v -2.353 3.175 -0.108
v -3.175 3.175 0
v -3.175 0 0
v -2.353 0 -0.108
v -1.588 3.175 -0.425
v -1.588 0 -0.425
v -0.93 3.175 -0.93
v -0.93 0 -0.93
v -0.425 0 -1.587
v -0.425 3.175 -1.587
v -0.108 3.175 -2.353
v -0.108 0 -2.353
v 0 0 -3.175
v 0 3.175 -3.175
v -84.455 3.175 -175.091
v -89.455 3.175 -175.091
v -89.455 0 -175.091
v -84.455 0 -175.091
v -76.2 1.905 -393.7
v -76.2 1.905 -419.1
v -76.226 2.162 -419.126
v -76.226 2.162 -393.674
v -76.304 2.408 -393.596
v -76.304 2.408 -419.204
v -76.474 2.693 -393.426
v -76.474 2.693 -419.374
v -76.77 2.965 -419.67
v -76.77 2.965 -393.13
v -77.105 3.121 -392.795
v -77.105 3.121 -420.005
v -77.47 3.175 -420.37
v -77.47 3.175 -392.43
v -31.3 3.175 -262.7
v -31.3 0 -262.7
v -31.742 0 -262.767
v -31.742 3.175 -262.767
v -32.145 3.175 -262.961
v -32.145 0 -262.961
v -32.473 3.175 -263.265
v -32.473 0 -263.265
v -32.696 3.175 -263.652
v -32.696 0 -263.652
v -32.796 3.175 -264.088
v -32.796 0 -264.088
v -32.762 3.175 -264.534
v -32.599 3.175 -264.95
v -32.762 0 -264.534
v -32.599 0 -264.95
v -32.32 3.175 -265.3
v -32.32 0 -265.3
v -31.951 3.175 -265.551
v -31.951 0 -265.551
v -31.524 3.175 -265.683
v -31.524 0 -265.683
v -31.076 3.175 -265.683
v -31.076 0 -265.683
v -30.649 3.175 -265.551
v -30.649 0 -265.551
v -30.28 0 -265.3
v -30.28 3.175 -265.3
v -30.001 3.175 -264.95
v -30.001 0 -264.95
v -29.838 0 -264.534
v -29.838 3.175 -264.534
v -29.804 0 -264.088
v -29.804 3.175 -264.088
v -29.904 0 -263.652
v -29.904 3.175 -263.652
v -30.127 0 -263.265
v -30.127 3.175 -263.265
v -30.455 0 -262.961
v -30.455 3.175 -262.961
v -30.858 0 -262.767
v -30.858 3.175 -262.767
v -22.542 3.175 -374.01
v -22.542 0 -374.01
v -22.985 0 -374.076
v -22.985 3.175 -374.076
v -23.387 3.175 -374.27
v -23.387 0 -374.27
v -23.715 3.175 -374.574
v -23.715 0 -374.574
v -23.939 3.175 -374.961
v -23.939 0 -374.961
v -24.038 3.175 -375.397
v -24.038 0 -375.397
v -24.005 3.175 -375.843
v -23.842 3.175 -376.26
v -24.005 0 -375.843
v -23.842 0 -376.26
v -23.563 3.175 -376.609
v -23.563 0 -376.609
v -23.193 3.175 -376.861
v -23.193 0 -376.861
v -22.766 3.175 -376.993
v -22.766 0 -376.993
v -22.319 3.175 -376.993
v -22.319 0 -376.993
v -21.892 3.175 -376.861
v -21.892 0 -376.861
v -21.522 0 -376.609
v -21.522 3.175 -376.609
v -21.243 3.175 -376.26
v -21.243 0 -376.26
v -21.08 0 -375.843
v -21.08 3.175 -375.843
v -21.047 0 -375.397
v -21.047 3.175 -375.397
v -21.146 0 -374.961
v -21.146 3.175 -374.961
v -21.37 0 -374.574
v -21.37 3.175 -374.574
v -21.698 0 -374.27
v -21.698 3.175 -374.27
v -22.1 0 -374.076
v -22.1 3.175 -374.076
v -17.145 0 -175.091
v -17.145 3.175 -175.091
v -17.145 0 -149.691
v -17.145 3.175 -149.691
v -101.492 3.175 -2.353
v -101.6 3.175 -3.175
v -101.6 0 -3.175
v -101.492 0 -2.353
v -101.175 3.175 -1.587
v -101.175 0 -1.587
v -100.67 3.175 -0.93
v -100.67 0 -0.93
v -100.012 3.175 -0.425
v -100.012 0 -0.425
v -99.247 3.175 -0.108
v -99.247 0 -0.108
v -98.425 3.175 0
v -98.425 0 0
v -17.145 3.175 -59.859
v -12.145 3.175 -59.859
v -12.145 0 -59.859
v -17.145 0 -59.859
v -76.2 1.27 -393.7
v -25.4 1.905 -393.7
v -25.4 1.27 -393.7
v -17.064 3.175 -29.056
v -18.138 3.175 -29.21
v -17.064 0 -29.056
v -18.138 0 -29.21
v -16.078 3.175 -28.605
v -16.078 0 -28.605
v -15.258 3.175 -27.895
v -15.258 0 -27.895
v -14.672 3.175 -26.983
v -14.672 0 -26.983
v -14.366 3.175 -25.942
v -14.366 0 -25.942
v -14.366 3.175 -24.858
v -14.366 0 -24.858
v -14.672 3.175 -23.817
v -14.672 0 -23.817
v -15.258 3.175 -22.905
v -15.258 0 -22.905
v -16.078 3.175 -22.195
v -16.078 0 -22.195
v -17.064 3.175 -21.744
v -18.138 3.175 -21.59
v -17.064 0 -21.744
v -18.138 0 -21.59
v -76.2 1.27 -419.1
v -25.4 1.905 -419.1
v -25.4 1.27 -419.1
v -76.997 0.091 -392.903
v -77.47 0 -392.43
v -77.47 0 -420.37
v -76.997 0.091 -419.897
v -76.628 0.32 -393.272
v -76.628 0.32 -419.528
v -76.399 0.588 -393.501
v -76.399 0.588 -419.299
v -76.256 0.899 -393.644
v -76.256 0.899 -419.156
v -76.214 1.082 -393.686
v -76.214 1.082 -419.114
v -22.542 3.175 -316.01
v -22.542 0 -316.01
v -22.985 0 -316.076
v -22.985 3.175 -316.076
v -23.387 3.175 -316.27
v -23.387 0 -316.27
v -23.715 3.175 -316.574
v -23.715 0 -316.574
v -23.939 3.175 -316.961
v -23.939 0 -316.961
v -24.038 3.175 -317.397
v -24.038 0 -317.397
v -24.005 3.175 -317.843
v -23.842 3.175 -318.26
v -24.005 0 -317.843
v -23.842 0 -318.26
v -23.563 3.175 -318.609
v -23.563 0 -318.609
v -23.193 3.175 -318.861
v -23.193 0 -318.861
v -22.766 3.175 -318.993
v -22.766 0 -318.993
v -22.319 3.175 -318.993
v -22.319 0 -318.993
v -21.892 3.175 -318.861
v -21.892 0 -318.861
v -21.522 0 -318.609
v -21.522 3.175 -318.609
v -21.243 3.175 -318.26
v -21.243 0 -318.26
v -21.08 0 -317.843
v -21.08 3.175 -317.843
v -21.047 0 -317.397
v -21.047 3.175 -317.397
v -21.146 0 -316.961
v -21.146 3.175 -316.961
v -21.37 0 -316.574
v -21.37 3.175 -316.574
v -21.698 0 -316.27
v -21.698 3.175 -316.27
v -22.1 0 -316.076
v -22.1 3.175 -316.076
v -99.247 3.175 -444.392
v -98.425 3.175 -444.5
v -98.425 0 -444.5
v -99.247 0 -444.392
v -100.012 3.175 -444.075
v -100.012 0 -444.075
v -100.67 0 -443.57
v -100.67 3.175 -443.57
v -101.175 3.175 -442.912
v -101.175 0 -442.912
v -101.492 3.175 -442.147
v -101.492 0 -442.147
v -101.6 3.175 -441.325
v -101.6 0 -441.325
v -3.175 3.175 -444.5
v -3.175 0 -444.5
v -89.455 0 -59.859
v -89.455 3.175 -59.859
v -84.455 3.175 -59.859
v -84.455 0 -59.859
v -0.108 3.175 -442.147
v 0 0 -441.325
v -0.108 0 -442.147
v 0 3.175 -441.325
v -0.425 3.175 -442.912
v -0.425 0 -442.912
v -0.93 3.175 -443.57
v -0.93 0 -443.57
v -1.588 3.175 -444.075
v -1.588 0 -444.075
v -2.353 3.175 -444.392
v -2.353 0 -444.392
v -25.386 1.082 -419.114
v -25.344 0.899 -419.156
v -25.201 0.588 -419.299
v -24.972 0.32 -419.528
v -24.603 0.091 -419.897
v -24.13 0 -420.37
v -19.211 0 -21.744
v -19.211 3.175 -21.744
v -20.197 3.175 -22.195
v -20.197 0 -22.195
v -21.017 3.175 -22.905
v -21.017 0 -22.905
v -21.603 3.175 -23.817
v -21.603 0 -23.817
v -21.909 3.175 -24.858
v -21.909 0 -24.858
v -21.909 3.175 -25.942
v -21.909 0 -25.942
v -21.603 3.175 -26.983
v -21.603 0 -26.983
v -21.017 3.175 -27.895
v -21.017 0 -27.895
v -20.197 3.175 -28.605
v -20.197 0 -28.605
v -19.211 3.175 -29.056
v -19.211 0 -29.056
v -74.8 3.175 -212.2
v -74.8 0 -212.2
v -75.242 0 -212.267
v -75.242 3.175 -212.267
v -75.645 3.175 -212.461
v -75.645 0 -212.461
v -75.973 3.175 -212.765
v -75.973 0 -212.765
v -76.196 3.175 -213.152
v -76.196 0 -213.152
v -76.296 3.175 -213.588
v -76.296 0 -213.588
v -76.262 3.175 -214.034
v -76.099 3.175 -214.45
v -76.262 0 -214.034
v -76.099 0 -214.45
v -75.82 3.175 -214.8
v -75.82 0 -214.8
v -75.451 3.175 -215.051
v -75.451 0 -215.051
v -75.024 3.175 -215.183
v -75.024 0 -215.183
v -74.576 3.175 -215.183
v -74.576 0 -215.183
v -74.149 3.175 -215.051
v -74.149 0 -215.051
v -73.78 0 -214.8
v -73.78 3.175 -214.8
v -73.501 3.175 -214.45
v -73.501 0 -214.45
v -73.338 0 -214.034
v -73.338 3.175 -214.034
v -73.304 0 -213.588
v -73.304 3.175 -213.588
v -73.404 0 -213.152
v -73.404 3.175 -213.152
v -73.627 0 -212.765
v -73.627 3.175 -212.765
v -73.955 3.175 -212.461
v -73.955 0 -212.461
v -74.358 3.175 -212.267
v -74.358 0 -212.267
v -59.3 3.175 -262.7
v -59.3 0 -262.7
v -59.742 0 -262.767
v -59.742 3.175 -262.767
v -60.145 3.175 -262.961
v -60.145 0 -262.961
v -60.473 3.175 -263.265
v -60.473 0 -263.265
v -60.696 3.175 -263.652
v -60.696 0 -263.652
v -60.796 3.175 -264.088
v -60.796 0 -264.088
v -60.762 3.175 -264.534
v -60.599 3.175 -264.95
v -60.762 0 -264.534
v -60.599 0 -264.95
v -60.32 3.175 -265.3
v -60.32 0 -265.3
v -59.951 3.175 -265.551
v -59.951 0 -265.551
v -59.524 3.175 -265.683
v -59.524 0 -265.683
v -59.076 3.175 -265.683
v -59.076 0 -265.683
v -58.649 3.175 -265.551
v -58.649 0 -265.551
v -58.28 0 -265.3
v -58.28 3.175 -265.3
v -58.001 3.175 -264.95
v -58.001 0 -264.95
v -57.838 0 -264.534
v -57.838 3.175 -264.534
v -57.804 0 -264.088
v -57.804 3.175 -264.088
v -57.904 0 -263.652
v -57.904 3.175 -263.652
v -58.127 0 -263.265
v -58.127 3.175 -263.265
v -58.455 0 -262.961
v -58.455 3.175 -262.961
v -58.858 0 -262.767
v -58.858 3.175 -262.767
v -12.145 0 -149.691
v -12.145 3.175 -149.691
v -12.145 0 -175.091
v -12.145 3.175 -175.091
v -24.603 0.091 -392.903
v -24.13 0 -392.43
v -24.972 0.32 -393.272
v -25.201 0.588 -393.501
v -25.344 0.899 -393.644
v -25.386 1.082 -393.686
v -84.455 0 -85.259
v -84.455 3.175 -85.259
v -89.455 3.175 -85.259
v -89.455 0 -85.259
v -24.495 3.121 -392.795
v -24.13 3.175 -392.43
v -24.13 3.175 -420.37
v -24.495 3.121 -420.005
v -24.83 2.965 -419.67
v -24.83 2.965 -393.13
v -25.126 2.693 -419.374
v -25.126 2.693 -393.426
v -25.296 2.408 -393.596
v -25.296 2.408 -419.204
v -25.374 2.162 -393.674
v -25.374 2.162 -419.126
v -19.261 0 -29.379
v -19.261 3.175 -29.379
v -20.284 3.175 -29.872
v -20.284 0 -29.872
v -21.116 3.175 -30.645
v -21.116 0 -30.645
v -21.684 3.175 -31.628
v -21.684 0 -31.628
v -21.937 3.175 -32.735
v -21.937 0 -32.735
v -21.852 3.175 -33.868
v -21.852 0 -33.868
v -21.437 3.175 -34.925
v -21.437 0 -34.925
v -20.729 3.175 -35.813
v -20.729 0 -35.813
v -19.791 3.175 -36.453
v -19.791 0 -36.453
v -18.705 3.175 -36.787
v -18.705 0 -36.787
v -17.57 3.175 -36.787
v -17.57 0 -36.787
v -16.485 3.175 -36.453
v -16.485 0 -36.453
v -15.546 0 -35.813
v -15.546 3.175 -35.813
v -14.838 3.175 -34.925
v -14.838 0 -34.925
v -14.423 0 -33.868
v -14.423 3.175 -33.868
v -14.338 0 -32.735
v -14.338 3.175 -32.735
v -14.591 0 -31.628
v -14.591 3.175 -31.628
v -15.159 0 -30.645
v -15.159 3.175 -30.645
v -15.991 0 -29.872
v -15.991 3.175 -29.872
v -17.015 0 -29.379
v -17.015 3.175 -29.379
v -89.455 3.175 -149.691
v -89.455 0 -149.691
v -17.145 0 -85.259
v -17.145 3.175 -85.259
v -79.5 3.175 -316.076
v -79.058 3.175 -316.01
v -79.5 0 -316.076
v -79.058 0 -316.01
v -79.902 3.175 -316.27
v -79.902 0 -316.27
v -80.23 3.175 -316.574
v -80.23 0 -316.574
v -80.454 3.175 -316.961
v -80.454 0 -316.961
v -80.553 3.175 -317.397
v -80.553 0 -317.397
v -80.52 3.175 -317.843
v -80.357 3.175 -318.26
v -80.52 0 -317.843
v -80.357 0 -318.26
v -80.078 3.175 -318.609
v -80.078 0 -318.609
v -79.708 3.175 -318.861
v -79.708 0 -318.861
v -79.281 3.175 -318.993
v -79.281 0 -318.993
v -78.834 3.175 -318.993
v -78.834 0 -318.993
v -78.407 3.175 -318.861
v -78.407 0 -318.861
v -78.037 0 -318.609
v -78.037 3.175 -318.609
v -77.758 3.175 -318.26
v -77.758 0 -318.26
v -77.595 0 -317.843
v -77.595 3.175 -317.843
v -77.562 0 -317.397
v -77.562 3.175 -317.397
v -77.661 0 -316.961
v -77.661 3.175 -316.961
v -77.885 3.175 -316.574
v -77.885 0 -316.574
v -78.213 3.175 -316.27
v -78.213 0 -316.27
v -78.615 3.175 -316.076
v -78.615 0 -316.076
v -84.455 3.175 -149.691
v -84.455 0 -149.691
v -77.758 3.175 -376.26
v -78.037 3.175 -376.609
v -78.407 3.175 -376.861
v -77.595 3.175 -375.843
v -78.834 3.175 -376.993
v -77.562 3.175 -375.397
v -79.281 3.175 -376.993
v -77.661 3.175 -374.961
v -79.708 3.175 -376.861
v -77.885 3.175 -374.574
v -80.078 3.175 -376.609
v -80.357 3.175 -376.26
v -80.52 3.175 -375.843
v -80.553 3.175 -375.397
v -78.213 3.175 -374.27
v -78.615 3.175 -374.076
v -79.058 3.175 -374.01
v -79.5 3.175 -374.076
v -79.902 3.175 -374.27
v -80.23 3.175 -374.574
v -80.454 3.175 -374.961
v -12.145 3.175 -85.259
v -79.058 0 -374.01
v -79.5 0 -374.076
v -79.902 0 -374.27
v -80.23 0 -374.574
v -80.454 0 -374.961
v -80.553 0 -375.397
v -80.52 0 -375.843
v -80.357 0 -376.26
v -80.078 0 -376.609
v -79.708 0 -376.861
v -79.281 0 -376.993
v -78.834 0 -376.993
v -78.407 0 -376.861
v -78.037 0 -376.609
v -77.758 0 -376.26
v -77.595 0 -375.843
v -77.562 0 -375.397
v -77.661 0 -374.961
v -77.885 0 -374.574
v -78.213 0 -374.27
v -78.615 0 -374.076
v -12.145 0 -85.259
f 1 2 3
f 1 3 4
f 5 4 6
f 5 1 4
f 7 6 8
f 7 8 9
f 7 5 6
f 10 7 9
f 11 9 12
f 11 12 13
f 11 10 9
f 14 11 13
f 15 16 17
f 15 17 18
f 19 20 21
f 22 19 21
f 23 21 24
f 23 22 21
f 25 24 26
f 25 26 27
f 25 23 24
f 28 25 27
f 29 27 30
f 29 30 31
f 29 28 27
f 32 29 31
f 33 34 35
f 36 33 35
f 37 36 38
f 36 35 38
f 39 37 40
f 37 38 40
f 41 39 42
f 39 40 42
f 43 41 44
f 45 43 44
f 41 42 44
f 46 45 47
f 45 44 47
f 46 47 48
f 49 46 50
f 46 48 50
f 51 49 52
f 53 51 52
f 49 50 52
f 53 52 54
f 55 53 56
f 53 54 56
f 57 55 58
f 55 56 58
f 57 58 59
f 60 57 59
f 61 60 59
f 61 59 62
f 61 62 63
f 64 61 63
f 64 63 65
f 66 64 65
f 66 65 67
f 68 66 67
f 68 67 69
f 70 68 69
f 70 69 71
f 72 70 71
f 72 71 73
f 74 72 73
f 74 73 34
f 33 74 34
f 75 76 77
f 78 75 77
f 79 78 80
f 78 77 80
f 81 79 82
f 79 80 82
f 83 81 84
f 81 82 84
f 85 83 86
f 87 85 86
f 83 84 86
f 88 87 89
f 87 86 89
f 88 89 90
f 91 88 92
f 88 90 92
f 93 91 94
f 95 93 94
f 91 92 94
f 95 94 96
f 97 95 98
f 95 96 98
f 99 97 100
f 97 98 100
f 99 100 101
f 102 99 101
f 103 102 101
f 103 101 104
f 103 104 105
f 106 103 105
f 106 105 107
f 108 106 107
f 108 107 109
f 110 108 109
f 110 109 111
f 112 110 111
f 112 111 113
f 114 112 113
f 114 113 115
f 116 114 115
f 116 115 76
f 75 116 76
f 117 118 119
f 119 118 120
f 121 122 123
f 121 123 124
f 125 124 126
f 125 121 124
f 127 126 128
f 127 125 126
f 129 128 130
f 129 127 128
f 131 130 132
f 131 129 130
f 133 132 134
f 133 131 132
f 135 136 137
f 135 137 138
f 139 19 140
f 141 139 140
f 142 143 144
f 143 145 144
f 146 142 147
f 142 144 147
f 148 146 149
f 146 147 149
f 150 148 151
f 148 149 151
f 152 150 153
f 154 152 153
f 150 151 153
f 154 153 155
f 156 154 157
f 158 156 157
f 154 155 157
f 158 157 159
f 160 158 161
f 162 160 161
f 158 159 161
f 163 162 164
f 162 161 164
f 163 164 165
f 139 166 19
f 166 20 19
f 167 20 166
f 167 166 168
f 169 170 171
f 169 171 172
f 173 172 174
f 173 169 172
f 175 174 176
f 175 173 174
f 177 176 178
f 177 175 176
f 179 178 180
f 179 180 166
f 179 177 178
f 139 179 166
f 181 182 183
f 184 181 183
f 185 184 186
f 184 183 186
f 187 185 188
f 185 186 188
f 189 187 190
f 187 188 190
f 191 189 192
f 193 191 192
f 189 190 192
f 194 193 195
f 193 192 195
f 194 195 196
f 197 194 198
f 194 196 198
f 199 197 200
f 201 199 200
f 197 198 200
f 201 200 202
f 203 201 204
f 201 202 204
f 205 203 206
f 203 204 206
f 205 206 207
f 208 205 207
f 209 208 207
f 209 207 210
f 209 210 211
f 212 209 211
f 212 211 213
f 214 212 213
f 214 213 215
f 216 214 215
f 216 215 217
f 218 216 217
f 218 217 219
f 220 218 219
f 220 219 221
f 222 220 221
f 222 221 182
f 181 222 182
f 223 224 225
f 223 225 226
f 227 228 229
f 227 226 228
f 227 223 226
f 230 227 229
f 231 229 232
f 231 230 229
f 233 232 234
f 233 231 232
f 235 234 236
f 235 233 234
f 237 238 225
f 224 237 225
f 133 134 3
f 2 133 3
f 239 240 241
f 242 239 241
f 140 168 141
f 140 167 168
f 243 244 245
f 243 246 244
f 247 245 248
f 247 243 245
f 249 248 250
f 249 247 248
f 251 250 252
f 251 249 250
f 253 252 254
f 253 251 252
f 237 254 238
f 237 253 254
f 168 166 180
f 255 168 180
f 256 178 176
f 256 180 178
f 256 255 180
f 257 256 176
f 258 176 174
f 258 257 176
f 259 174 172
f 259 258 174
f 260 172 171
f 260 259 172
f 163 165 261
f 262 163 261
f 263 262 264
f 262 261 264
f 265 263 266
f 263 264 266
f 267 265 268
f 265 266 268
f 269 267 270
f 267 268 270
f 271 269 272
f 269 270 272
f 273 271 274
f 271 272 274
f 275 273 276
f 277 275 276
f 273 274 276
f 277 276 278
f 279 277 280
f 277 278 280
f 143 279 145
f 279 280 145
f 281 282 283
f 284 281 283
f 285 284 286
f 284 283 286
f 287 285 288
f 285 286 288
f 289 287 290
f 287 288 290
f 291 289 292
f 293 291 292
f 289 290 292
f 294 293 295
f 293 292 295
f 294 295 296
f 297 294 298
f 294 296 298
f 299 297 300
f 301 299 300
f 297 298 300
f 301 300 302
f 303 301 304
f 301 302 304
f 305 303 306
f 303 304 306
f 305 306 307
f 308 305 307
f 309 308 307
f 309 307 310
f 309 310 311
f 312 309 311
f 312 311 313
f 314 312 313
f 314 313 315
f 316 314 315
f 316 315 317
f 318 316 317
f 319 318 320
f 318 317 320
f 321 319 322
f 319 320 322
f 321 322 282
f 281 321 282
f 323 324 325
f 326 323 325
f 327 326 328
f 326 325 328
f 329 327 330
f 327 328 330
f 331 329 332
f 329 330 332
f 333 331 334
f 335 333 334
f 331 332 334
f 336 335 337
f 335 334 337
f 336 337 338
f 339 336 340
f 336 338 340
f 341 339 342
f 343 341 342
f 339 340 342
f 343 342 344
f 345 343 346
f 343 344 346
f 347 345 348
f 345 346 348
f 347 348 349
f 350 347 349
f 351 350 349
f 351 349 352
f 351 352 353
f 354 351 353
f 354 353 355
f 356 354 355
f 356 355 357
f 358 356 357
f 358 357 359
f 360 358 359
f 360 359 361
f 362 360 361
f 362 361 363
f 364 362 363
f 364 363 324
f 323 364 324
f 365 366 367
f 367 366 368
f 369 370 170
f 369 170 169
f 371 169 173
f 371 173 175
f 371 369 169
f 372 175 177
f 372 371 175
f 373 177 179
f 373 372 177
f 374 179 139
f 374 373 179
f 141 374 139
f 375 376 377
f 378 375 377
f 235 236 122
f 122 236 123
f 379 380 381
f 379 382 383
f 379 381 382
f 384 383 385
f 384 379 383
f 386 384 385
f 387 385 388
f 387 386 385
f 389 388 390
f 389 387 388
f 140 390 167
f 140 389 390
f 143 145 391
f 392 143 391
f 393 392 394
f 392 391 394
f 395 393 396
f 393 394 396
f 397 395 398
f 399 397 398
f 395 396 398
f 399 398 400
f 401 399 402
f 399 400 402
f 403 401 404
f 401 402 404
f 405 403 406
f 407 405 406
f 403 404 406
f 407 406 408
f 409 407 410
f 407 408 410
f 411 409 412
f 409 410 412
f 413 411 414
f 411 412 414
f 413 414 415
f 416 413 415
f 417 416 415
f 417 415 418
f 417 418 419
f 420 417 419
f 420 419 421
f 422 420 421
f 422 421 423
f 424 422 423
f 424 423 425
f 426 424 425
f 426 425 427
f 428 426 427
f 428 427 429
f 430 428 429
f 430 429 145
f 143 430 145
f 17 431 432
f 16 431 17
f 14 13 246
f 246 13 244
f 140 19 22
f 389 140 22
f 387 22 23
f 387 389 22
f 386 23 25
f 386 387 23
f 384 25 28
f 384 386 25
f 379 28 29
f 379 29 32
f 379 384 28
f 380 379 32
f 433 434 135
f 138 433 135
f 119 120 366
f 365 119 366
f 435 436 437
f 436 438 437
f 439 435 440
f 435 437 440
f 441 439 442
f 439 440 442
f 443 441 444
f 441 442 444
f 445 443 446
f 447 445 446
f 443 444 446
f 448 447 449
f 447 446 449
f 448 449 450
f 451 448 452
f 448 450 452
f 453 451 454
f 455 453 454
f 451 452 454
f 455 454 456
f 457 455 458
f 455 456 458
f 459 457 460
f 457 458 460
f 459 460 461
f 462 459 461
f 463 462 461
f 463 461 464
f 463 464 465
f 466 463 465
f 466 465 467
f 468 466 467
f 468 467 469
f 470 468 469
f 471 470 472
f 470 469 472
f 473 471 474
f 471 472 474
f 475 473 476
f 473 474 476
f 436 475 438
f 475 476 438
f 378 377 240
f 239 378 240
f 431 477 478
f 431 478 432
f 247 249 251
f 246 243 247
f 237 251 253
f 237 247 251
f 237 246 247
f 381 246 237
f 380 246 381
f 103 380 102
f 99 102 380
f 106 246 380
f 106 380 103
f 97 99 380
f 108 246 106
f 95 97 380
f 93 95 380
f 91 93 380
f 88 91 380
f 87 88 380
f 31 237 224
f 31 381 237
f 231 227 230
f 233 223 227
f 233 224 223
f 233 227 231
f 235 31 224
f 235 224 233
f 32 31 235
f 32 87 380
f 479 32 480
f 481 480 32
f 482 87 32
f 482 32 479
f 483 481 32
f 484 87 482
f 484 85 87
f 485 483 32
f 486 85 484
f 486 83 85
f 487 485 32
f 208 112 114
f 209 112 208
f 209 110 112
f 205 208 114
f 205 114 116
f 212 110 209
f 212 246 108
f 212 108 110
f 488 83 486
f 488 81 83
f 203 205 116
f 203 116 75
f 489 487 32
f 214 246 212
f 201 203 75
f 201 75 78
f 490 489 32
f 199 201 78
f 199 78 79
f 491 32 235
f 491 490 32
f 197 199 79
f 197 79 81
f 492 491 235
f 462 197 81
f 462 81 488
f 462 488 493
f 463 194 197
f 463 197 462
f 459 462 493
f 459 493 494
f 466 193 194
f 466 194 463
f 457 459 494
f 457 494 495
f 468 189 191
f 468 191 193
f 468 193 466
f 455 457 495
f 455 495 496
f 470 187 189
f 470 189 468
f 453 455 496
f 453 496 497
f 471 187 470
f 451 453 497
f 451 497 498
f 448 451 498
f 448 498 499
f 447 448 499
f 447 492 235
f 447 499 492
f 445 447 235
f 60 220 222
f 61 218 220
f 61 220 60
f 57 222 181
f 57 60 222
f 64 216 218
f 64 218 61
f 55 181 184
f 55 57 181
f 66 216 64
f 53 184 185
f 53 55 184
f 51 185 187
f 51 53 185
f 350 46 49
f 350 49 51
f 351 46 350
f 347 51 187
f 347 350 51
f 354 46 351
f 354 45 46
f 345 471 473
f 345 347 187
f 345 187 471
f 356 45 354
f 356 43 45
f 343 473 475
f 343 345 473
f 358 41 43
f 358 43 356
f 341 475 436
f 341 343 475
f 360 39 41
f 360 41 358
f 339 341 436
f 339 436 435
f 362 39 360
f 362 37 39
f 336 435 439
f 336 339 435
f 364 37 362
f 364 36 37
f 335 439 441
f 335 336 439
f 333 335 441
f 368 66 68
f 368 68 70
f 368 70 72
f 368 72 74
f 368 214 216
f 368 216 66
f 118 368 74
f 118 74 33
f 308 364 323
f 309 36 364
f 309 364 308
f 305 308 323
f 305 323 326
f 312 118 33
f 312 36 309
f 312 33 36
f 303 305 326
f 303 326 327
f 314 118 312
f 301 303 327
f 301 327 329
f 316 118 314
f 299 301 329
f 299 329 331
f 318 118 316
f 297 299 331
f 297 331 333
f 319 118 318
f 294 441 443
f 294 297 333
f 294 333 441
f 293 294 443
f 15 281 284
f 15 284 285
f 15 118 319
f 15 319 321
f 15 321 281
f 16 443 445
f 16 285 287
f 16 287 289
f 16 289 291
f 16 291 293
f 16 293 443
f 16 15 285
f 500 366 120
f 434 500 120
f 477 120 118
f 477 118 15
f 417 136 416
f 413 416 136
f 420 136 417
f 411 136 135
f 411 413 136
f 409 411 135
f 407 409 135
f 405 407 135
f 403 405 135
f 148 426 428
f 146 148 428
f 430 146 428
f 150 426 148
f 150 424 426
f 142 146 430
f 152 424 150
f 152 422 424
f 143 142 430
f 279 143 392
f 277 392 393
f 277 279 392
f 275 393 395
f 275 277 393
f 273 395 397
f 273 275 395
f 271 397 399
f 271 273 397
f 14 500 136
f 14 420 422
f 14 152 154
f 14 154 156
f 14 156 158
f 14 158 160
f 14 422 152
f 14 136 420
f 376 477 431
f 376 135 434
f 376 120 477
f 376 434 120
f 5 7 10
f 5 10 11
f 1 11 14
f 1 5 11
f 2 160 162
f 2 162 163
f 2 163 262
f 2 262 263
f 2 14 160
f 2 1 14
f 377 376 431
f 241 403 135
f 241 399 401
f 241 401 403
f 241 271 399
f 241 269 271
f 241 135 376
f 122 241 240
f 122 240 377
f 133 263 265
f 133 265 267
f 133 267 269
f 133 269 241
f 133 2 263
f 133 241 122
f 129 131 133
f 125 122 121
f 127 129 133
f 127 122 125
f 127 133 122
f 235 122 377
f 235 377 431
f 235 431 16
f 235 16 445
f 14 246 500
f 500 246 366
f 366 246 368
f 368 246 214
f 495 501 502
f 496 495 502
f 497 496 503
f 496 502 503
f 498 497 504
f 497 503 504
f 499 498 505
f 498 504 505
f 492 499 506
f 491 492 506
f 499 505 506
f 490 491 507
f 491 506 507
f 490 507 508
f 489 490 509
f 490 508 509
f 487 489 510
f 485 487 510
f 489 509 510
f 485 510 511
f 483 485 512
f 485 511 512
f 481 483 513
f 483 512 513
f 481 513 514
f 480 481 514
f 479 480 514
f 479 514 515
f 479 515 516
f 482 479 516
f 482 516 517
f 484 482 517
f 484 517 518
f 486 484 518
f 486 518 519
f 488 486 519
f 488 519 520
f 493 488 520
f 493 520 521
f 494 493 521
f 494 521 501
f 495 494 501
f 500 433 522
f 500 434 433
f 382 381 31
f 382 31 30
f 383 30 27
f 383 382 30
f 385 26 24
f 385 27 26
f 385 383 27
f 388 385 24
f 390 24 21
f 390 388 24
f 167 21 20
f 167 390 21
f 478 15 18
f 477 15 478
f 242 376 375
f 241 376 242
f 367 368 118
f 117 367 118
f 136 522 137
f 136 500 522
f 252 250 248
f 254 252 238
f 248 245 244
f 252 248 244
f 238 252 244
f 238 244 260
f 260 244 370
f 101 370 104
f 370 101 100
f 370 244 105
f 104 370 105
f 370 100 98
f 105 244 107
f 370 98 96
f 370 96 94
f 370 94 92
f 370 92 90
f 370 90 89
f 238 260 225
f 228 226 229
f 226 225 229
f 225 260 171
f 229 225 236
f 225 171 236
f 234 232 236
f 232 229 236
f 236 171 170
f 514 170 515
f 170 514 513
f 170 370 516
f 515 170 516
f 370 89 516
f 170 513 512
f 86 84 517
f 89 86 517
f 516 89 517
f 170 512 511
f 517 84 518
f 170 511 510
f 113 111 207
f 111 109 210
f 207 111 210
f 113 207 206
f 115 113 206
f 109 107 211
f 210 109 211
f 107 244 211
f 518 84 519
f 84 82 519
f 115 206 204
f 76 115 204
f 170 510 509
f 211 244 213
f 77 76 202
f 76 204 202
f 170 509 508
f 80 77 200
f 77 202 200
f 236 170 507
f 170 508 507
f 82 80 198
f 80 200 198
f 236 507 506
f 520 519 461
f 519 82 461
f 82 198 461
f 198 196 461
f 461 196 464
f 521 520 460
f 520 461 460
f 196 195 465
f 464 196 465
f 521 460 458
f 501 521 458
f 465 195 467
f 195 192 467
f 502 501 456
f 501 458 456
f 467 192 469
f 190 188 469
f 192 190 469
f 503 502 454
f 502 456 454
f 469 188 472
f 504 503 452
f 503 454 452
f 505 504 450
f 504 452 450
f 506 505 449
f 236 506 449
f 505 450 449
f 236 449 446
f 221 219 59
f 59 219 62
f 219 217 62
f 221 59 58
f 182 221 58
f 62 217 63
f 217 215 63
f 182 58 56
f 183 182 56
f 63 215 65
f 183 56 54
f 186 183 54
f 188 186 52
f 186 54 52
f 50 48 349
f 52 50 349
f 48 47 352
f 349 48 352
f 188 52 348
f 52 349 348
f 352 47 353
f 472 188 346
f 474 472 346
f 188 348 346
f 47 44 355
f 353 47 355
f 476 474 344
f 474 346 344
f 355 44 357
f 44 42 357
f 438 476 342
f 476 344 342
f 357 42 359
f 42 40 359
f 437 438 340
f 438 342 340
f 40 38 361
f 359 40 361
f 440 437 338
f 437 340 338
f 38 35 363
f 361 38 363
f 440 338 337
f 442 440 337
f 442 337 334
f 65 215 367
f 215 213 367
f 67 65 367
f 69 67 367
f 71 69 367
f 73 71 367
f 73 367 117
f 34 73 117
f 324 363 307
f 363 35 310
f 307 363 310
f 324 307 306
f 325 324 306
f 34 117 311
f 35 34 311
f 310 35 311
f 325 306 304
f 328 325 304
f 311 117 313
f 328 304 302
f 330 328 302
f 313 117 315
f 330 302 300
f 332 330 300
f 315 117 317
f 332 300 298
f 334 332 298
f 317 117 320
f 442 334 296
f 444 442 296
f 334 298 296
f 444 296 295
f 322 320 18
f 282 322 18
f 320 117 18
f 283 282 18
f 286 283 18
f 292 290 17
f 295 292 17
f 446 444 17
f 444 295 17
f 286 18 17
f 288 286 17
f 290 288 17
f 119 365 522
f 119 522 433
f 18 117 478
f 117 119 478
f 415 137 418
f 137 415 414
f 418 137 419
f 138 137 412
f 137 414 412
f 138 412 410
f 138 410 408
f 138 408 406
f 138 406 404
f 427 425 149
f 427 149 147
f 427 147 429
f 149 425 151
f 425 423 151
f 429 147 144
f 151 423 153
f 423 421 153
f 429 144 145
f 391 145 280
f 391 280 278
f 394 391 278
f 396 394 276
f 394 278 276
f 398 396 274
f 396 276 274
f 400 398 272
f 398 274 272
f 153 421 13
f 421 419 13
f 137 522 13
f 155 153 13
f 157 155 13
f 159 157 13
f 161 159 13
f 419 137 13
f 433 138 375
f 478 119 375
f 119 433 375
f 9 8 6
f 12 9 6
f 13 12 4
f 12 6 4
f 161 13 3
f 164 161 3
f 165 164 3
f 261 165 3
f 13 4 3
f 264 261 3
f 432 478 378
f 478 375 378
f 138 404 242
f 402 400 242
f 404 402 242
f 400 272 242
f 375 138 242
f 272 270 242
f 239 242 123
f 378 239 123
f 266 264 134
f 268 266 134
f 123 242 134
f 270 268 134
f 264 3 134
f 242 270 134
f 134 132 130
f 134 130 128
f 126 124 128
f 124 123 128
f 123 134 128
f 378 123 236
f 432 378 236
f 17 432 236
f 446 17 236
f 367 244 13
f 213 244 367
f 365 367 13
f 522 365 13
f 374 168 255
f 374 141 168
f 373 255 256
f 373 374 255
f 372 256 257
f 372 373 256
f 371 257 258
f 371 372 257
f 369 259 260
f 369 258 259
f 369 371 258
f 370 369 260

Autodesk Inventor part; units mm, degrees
ref_plane "YZ Plane" through (0, 0, 0) normal (1, 0, 0) x (0, 1, 0)
ref_plane "XZ Plane" through (0, 0, 0) normal (0, 1, 0) x (-1, 0, 0)
ref_plane "XY Plane" through (0, 0, 0) normal (0, 0, 1) x (1, 0, 0)
sketch "Sketch1" plane through (0, 0, 0) normal (0, 1, 0) x (-1, 0, 0)
  line L0 (0, 0) -> (0, -444.5)
  line L1 (0, -444.5) -> (101.6, -444.5)
  line L2 (101.6, -444.5) -> (101.6, 0)
  line L3 (101.6, 0) -> (0, 0)
  dimension "d0" = 444.5
  dimension "d1" = 101.6
extrude "Extrusion1" add sketch "Sketch1" along normal blind 3.175
sketch "Sketch2" plane through (0, 3.175, 0) normal (0, 1, 0) x (1, 0, 0)
  line L0 (0, 444.5) -> (-101.6, 444.5) projected
  line L1 (-101.6, 444.5) -> (-101.6, 419.1)
  line L2 (-76.2, 419.1) -> (-76.2, 393.7)
  line L3 (-101.6, 0) -> (0, 0) projected
  line L4 (-50.8, 0) -> (-50.8, 463.567) construction
  line L5 (0, 444.5) -> (0, 419.1)
  line L6 (-25.4, 419.1) -> (-25.4, 393.7)
  line L7 (-101.6, 393.7) -> (-101.6, 0)
  line L8 (-101.6, 0) -> (0, 0)
  line L9 (0, 393.7) -> (0, 0)
  line L10 (-76.2, 393.7) -> (-25.4, 393.7)
  line L11 (-76.2, 419.1) -> (-25.4, 419.1)
  line L12 (-101.6, 444.5) -> (-101.6, 0) projected
  dimension "d6" = 25.4
  dimension "d46" = 25.4
  dimension "d47" = 25.4
extrude "Extrusion2" cut sketch "Sketch2" against normal blind 3.175
sketch "Sketch3" plane through (0, 3.175, 0) normal (0, 1, 0) x (1, 0, 0)
  line L0 (0, 444.5) -> (-101.6, 444.5) projected
  line L1 (-50.8, 444.5) -> (-50.8, -69.4552) construction
  line L2 (-50.8, 375.5095) -> (-79.0575, 375.5095) construction
  line L3 (-79.0575, 375.5095) -> (-79.0575, 317.5095) construction
  line L4 (-50.8, 375.5095) -> (-22.5425, 375.5095) construction
  line L5 (-22.5425, 375.5095) -> (-22.5425, 317.5095) construction
  line L6 (-79.0575, 317.5095) -> (-22.5425, 317.5095) construction
  circle A0 centre (-79.0575, 317.5095) radius 1.5
  circle A1 centre (-22.5425, 317.5095) radius 1.5
  circle A2 centre (-22.5425, 375.5095) radius 1.5
  circle A3 centre (-79.0575, 375.5095) radius 1.5
  point P0 (0, 0)
  dimension "d9" = 28.2575
  dimension "d10" = 58
  dimension "d11" = 3
hole "Hole1" at (-79.0575, 3.175, -317.5095) at (-22.5425, 3.175, -317.5095) at (-79.0575, 3.175, -375.5095) at (-22.5425, 3.175, -375.5095) direction (0, -1, 0) diameter 3 end through all
sketch "Sketch4" plane through (0, 3.175, 0) normal (0, 1, 0) x (1, 0, 0)
  line L0 (0, 444.5) -> (-101.6, 444.5) projected
  line L1 (-50.8, 444.5) -> (-50.8, -14.5514) construction
  line L2 (-50.8, 266.7) -> (-77.3, 266.7) construction
  line L3 (-77.3, 266.7) -> (-77.3, 198.7) construction
  line L4 (-77.3, 198.7) -> (-50.8, 198.7) construction
  line L5 (-50.8, 266.7) -> (-24.3, 266.7) construction
  line L6 (-24.3, 266.7) -> (-24.3, 198.7) construction
  line L7 (-24.3, 198.7) -> (-50.8, 198.7) construction
  circle A0 centre (-74.8, 213.7) radius 1.5
  circle A1 centre (-31.3, 264.2) radius 1.5
  circle A2 centre (-59.3, 264.2) radius 1.5
  point P0 (0, 0)
  dimension "d19" = 26.5
  dimension "d20" = 68
  dimension "d21" = 3
  dimension "d22" = 15
  dimension "d23" = 50.5
  dimension "d24" = 3
  dimension "d25" = 3
  dimension "d26" = 7
  dimension "d27" = 65.5
  dimension "d28" = 35
  dimension "d29" = 65.5
  dimension "d37" = 177.8
hole "Hole2" at (-74.8, 3.175, -213.7) at (-59.3, 3.175, -264.2) at (-31.3, 3.175, -264.2) direction (0, -1, 0) diameter 3 end through all
sketch "Sketch5" plane through (0, 3.175, 0) normal (0, 1, 0) x (1, 0, 0)
  line L0 (-101.6, 0) -> (0, 0) projected
  line L1 (-50.8, 0) -> (-50.8, 459.8943) construction
  line L2 (-50.8, 203.2) -> (-84.455, 203.2)
  line L3 (-84.455, 203.2) -> (-84.455, 31.75)
  line L4 (0, 444.5) -> (-101.6, 444.5) projected
  line L5 (-50.8, 203.2) -> (-17.145, 203.2)
  line L6 (-17.145, 203.2) -> (-17.145, 31.75)
  line L7 (-84.455, 31.75) -> (-17.145, 31.75)
  line L8 (-84.455, 59.8594) -> (-84.455, 85.2594)
  line L9 (-84.455, 85.2594) -> (-89.455, 85.2594)
  line L10 (-89.455, 85.2594) -> (-89.455, 59.8594)
  line L11 (-89.455, 59.8594) -> (-84.455, 59.8594)
  line L12 (-84.455, 117.475) -> (-17.145, 117.475) construction
  line L13 (-17.145, 59.8594) -> (-17.145, 85.2594)
  line L14 (-17.145, 85.2594) -> (-12.145, 85.2594)
  line L15 (-12.145, 85.2594) -> (-12.145, 59.8594)
  line L16 (-12.145, 59.8594) -> (-17.145, 59.8594)
  line L17 (-17.145, 117.475) -> (-84.455, 117.475) construction
  line L18 (-84.455, 175.0906) -> (-84.455, 149.6906)
  line L19 (-84.455, 149.6906) -> (-89.455, 149.6906)
  line L20 (-89.455, 149.6906) -> (-89.455, 175.0906)
  line L21 (-89.455, 175.0906) -> (-84.455, 175.0906)
  line L22 (-17.145, 149.6906) -> (-12.145, 149.6906)
  line L23 (-17.145, 175.0906) -> (-17.145, 149.6906)
  line L24 (-12.145, 175.0906) -> (-17.145, 175.0906)
  line L25 (-12.145, 149.6906) -> (-12.145, 175.0906)
  dimension "d38" = 33.655
  dimension "d39" = 171.45
  dimension "d40" = 241.3
  dimension "d41" = 25.4
  dimension "d42" = 5
extrude "Extrusion3" cut sketch "Sketch5" against normal blind 3.175 contours L3 L19 L20 L21 | L24 L25 L22 L6 | L3 L11 L10 L9 | L14 L15 L16 L6
sketch "Sketch6" plane through (0, 3.175, 0) normal (0, 1, 0) x (1, 0, 0)
  circle A0 centre (-18.1376, 25.4) radius 3.81
  circle A1 centre (-18.1376, 33.02) radius 3.81
  line L0 (-101.6, 0) -> (0, 0) projected
  dimension "d48" = 7.62
  dimension "d49" = 7.62
  dimension "d57" = 25.4
  dimension "d58" = 33.02
hole "Hole3" at (-18.1376, 3.175, -33.02) at (-18.1376, 3.175, -25.4) direction (0, -1, 0) diameter 7.62 end through all
fillet "Fillet1" radius 3.175 3 edges at (0, 1.5875, -444.5) (-101.6, 1.5875, 0) (0, 1.5875, 0)
fillet "Fillet2" radius 3.175 1 edges at (-101.6, 1.5875, -444.5)
fillet "Fillet3" radius 1.27 8 edges at (-50.8, 0, -393.7) (-50.8, 3.175, -393.7) (-25.4, 0, -406.4) (-25.4, 3.175, -406.4) (-50.8, 3.175, -419.1) (-76.2, 3.175, -406.4) (-76.2, 0, -406.4) (-50.8, 0, -419.1)
properties part number "Board Cage 2"
